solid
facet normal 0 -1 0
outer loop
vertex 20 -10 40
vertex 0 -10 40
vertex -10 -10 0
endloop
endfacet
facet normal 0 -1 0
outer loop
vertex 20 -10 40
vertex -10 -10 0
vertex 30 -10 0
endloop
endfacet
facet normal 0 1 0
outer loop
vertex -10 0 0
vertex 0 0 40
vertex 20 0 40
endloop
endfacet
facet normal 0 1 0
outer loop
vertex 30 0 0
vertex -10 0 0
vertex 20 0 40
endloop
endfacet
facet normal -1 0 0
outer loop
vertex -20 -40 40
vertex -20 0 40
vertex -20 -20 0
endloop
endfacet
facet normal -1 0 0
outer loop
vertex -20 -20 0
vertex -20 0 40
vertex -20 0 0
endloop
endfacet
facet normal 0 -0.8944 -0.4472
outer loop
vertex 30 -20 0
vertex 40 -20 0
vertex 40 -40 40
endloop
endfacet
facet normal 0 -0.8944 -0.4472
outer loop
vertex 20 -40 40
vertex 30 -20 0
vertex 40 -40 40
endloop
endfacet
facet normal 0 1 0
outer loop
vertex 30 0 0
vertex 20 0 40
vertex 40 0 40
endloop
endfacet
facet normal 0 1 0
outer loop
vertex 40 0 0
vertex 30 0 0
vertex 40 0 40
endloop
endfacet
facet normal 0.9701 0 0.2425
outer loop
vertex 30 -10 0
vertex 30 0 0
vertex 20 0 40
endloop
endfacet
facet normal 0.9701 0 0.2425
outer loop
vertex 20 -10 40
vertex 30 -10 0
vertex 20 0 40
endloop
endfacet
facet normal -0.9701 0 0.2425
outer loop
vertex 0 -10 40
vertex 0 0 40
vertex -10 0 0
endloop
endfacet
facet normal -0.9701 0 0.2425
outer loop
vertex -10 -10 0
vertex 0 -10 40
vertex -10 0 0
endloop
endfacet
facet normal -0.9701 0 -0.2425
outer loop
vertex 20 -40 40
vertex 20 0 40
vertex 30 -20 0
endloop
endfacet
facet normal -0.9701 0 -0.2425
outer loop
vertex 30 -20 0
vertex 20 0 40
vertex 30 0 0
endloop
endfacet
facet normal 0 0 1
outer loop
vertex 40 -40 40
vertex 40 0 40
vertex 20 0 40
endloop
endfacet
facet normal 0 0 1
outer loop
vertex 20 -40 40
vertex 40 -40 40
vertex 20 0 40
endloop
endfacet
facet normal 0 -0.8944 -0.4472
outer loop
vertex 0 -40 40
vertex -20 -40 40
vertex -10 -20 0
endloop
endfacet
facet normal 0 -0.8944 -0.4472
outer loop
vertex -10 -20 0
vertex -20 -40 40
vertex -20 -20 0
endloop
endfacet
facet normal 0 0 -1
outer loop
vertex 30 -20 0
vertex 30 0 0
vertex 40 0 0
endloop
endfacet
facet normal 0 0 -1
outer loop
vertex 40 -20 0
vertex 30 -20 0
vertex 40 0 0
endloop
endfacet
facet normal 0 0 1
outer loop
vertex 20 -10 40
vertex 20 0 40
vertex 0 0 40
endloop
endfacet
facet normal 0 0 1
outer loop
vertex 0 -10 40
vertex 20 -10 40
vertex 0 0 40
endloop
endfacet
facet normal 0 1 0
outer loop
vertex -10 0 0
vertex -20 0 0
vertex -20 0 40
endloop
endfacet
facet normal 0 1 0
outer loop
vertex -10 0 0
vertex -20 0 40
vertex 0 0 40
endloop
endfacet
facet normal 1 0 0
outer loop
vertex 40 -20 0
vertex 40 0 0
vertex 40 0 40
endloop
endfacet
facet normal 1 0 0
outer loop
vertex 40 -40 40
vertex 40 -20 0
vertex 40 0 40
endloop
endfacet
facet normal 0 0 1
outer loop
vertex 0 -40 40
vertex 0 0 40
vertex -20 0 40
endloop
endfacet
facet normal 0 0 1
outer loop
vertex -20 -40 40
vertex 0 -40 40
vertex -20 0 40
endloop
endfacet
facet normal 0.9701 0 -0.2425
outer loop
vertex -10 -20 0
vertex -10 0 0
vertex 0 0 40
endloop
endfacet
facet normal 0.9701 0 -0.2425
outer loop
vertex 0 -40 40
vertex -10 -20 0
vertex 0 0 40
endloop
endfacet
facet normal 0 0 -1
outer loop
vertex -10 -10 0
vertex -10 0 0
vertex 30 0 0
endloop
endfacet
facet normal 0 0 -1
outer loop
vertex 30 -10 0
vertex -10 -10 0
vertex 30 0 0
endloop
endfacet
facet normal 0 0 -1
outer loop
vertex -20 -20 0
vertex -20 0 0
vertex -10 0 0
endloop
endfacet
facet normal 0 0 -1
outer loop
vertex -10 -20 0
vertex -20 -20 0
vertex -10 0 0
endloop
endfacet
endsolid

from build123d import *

# Parameters (mm, degrees)
F1_DEPTH = 40
F2_DEPTH = 40
F3_DEPTH = 10
F5_DEPTH = 25
F7_DEPTH = 25


with BuildPart() as f1:
    # F0 (on Front) → F1 (new body)
    with BuildSketch(Plane.XZ):
        Polygon((-20, 40), (-20, 0), (-10, 0), (0, 40), align=None)
    extrude(amount=F1_DEPTH)

    # F4 (on face) → F5 (cut)
    with BuildSketch(Plane(origin=(-20, 0, 0), x_dir=(0, -1, 0), z_dir=(-1, 0, 0))):
        Polygon((40, 40), (20, 0), (30.000001, 0), (40, 0), align=None)
    extrude(amount=-F5_DEPTH, mode=Mode.SUBTRACT)


with BuildPart() as f2:
    # F0 (on Front) → F2 (new body)
    with BuildSketch(Plane.XZ):
        Polygon((20, 40), (30, 0), (40, 0), (40, 40), align=None)
    extrude(amount=F2_DEPTH)

    # F6 (on face) → F7 (cut)
    with BuildSketch(Plane.YZ.offset(40)):
        Polygon((-30, 0), (-20, 0), (-40, 40), (-40, 0), align=None)
    extrude(amount=-F7_DEPTH, mode=Mode.SUBTRACT)


with BuildPart() as f3:
    # F0 (on Front) → F3 (new body)
    with BuildSketch(Plane.XZ):
        Polygon((0, 40), (-10, 0), (30, 0), (20, 40), align=None)
    extrude(amount=F3_DEPTH)


solid = Compound([f1.part, f2.part, f3.part])
